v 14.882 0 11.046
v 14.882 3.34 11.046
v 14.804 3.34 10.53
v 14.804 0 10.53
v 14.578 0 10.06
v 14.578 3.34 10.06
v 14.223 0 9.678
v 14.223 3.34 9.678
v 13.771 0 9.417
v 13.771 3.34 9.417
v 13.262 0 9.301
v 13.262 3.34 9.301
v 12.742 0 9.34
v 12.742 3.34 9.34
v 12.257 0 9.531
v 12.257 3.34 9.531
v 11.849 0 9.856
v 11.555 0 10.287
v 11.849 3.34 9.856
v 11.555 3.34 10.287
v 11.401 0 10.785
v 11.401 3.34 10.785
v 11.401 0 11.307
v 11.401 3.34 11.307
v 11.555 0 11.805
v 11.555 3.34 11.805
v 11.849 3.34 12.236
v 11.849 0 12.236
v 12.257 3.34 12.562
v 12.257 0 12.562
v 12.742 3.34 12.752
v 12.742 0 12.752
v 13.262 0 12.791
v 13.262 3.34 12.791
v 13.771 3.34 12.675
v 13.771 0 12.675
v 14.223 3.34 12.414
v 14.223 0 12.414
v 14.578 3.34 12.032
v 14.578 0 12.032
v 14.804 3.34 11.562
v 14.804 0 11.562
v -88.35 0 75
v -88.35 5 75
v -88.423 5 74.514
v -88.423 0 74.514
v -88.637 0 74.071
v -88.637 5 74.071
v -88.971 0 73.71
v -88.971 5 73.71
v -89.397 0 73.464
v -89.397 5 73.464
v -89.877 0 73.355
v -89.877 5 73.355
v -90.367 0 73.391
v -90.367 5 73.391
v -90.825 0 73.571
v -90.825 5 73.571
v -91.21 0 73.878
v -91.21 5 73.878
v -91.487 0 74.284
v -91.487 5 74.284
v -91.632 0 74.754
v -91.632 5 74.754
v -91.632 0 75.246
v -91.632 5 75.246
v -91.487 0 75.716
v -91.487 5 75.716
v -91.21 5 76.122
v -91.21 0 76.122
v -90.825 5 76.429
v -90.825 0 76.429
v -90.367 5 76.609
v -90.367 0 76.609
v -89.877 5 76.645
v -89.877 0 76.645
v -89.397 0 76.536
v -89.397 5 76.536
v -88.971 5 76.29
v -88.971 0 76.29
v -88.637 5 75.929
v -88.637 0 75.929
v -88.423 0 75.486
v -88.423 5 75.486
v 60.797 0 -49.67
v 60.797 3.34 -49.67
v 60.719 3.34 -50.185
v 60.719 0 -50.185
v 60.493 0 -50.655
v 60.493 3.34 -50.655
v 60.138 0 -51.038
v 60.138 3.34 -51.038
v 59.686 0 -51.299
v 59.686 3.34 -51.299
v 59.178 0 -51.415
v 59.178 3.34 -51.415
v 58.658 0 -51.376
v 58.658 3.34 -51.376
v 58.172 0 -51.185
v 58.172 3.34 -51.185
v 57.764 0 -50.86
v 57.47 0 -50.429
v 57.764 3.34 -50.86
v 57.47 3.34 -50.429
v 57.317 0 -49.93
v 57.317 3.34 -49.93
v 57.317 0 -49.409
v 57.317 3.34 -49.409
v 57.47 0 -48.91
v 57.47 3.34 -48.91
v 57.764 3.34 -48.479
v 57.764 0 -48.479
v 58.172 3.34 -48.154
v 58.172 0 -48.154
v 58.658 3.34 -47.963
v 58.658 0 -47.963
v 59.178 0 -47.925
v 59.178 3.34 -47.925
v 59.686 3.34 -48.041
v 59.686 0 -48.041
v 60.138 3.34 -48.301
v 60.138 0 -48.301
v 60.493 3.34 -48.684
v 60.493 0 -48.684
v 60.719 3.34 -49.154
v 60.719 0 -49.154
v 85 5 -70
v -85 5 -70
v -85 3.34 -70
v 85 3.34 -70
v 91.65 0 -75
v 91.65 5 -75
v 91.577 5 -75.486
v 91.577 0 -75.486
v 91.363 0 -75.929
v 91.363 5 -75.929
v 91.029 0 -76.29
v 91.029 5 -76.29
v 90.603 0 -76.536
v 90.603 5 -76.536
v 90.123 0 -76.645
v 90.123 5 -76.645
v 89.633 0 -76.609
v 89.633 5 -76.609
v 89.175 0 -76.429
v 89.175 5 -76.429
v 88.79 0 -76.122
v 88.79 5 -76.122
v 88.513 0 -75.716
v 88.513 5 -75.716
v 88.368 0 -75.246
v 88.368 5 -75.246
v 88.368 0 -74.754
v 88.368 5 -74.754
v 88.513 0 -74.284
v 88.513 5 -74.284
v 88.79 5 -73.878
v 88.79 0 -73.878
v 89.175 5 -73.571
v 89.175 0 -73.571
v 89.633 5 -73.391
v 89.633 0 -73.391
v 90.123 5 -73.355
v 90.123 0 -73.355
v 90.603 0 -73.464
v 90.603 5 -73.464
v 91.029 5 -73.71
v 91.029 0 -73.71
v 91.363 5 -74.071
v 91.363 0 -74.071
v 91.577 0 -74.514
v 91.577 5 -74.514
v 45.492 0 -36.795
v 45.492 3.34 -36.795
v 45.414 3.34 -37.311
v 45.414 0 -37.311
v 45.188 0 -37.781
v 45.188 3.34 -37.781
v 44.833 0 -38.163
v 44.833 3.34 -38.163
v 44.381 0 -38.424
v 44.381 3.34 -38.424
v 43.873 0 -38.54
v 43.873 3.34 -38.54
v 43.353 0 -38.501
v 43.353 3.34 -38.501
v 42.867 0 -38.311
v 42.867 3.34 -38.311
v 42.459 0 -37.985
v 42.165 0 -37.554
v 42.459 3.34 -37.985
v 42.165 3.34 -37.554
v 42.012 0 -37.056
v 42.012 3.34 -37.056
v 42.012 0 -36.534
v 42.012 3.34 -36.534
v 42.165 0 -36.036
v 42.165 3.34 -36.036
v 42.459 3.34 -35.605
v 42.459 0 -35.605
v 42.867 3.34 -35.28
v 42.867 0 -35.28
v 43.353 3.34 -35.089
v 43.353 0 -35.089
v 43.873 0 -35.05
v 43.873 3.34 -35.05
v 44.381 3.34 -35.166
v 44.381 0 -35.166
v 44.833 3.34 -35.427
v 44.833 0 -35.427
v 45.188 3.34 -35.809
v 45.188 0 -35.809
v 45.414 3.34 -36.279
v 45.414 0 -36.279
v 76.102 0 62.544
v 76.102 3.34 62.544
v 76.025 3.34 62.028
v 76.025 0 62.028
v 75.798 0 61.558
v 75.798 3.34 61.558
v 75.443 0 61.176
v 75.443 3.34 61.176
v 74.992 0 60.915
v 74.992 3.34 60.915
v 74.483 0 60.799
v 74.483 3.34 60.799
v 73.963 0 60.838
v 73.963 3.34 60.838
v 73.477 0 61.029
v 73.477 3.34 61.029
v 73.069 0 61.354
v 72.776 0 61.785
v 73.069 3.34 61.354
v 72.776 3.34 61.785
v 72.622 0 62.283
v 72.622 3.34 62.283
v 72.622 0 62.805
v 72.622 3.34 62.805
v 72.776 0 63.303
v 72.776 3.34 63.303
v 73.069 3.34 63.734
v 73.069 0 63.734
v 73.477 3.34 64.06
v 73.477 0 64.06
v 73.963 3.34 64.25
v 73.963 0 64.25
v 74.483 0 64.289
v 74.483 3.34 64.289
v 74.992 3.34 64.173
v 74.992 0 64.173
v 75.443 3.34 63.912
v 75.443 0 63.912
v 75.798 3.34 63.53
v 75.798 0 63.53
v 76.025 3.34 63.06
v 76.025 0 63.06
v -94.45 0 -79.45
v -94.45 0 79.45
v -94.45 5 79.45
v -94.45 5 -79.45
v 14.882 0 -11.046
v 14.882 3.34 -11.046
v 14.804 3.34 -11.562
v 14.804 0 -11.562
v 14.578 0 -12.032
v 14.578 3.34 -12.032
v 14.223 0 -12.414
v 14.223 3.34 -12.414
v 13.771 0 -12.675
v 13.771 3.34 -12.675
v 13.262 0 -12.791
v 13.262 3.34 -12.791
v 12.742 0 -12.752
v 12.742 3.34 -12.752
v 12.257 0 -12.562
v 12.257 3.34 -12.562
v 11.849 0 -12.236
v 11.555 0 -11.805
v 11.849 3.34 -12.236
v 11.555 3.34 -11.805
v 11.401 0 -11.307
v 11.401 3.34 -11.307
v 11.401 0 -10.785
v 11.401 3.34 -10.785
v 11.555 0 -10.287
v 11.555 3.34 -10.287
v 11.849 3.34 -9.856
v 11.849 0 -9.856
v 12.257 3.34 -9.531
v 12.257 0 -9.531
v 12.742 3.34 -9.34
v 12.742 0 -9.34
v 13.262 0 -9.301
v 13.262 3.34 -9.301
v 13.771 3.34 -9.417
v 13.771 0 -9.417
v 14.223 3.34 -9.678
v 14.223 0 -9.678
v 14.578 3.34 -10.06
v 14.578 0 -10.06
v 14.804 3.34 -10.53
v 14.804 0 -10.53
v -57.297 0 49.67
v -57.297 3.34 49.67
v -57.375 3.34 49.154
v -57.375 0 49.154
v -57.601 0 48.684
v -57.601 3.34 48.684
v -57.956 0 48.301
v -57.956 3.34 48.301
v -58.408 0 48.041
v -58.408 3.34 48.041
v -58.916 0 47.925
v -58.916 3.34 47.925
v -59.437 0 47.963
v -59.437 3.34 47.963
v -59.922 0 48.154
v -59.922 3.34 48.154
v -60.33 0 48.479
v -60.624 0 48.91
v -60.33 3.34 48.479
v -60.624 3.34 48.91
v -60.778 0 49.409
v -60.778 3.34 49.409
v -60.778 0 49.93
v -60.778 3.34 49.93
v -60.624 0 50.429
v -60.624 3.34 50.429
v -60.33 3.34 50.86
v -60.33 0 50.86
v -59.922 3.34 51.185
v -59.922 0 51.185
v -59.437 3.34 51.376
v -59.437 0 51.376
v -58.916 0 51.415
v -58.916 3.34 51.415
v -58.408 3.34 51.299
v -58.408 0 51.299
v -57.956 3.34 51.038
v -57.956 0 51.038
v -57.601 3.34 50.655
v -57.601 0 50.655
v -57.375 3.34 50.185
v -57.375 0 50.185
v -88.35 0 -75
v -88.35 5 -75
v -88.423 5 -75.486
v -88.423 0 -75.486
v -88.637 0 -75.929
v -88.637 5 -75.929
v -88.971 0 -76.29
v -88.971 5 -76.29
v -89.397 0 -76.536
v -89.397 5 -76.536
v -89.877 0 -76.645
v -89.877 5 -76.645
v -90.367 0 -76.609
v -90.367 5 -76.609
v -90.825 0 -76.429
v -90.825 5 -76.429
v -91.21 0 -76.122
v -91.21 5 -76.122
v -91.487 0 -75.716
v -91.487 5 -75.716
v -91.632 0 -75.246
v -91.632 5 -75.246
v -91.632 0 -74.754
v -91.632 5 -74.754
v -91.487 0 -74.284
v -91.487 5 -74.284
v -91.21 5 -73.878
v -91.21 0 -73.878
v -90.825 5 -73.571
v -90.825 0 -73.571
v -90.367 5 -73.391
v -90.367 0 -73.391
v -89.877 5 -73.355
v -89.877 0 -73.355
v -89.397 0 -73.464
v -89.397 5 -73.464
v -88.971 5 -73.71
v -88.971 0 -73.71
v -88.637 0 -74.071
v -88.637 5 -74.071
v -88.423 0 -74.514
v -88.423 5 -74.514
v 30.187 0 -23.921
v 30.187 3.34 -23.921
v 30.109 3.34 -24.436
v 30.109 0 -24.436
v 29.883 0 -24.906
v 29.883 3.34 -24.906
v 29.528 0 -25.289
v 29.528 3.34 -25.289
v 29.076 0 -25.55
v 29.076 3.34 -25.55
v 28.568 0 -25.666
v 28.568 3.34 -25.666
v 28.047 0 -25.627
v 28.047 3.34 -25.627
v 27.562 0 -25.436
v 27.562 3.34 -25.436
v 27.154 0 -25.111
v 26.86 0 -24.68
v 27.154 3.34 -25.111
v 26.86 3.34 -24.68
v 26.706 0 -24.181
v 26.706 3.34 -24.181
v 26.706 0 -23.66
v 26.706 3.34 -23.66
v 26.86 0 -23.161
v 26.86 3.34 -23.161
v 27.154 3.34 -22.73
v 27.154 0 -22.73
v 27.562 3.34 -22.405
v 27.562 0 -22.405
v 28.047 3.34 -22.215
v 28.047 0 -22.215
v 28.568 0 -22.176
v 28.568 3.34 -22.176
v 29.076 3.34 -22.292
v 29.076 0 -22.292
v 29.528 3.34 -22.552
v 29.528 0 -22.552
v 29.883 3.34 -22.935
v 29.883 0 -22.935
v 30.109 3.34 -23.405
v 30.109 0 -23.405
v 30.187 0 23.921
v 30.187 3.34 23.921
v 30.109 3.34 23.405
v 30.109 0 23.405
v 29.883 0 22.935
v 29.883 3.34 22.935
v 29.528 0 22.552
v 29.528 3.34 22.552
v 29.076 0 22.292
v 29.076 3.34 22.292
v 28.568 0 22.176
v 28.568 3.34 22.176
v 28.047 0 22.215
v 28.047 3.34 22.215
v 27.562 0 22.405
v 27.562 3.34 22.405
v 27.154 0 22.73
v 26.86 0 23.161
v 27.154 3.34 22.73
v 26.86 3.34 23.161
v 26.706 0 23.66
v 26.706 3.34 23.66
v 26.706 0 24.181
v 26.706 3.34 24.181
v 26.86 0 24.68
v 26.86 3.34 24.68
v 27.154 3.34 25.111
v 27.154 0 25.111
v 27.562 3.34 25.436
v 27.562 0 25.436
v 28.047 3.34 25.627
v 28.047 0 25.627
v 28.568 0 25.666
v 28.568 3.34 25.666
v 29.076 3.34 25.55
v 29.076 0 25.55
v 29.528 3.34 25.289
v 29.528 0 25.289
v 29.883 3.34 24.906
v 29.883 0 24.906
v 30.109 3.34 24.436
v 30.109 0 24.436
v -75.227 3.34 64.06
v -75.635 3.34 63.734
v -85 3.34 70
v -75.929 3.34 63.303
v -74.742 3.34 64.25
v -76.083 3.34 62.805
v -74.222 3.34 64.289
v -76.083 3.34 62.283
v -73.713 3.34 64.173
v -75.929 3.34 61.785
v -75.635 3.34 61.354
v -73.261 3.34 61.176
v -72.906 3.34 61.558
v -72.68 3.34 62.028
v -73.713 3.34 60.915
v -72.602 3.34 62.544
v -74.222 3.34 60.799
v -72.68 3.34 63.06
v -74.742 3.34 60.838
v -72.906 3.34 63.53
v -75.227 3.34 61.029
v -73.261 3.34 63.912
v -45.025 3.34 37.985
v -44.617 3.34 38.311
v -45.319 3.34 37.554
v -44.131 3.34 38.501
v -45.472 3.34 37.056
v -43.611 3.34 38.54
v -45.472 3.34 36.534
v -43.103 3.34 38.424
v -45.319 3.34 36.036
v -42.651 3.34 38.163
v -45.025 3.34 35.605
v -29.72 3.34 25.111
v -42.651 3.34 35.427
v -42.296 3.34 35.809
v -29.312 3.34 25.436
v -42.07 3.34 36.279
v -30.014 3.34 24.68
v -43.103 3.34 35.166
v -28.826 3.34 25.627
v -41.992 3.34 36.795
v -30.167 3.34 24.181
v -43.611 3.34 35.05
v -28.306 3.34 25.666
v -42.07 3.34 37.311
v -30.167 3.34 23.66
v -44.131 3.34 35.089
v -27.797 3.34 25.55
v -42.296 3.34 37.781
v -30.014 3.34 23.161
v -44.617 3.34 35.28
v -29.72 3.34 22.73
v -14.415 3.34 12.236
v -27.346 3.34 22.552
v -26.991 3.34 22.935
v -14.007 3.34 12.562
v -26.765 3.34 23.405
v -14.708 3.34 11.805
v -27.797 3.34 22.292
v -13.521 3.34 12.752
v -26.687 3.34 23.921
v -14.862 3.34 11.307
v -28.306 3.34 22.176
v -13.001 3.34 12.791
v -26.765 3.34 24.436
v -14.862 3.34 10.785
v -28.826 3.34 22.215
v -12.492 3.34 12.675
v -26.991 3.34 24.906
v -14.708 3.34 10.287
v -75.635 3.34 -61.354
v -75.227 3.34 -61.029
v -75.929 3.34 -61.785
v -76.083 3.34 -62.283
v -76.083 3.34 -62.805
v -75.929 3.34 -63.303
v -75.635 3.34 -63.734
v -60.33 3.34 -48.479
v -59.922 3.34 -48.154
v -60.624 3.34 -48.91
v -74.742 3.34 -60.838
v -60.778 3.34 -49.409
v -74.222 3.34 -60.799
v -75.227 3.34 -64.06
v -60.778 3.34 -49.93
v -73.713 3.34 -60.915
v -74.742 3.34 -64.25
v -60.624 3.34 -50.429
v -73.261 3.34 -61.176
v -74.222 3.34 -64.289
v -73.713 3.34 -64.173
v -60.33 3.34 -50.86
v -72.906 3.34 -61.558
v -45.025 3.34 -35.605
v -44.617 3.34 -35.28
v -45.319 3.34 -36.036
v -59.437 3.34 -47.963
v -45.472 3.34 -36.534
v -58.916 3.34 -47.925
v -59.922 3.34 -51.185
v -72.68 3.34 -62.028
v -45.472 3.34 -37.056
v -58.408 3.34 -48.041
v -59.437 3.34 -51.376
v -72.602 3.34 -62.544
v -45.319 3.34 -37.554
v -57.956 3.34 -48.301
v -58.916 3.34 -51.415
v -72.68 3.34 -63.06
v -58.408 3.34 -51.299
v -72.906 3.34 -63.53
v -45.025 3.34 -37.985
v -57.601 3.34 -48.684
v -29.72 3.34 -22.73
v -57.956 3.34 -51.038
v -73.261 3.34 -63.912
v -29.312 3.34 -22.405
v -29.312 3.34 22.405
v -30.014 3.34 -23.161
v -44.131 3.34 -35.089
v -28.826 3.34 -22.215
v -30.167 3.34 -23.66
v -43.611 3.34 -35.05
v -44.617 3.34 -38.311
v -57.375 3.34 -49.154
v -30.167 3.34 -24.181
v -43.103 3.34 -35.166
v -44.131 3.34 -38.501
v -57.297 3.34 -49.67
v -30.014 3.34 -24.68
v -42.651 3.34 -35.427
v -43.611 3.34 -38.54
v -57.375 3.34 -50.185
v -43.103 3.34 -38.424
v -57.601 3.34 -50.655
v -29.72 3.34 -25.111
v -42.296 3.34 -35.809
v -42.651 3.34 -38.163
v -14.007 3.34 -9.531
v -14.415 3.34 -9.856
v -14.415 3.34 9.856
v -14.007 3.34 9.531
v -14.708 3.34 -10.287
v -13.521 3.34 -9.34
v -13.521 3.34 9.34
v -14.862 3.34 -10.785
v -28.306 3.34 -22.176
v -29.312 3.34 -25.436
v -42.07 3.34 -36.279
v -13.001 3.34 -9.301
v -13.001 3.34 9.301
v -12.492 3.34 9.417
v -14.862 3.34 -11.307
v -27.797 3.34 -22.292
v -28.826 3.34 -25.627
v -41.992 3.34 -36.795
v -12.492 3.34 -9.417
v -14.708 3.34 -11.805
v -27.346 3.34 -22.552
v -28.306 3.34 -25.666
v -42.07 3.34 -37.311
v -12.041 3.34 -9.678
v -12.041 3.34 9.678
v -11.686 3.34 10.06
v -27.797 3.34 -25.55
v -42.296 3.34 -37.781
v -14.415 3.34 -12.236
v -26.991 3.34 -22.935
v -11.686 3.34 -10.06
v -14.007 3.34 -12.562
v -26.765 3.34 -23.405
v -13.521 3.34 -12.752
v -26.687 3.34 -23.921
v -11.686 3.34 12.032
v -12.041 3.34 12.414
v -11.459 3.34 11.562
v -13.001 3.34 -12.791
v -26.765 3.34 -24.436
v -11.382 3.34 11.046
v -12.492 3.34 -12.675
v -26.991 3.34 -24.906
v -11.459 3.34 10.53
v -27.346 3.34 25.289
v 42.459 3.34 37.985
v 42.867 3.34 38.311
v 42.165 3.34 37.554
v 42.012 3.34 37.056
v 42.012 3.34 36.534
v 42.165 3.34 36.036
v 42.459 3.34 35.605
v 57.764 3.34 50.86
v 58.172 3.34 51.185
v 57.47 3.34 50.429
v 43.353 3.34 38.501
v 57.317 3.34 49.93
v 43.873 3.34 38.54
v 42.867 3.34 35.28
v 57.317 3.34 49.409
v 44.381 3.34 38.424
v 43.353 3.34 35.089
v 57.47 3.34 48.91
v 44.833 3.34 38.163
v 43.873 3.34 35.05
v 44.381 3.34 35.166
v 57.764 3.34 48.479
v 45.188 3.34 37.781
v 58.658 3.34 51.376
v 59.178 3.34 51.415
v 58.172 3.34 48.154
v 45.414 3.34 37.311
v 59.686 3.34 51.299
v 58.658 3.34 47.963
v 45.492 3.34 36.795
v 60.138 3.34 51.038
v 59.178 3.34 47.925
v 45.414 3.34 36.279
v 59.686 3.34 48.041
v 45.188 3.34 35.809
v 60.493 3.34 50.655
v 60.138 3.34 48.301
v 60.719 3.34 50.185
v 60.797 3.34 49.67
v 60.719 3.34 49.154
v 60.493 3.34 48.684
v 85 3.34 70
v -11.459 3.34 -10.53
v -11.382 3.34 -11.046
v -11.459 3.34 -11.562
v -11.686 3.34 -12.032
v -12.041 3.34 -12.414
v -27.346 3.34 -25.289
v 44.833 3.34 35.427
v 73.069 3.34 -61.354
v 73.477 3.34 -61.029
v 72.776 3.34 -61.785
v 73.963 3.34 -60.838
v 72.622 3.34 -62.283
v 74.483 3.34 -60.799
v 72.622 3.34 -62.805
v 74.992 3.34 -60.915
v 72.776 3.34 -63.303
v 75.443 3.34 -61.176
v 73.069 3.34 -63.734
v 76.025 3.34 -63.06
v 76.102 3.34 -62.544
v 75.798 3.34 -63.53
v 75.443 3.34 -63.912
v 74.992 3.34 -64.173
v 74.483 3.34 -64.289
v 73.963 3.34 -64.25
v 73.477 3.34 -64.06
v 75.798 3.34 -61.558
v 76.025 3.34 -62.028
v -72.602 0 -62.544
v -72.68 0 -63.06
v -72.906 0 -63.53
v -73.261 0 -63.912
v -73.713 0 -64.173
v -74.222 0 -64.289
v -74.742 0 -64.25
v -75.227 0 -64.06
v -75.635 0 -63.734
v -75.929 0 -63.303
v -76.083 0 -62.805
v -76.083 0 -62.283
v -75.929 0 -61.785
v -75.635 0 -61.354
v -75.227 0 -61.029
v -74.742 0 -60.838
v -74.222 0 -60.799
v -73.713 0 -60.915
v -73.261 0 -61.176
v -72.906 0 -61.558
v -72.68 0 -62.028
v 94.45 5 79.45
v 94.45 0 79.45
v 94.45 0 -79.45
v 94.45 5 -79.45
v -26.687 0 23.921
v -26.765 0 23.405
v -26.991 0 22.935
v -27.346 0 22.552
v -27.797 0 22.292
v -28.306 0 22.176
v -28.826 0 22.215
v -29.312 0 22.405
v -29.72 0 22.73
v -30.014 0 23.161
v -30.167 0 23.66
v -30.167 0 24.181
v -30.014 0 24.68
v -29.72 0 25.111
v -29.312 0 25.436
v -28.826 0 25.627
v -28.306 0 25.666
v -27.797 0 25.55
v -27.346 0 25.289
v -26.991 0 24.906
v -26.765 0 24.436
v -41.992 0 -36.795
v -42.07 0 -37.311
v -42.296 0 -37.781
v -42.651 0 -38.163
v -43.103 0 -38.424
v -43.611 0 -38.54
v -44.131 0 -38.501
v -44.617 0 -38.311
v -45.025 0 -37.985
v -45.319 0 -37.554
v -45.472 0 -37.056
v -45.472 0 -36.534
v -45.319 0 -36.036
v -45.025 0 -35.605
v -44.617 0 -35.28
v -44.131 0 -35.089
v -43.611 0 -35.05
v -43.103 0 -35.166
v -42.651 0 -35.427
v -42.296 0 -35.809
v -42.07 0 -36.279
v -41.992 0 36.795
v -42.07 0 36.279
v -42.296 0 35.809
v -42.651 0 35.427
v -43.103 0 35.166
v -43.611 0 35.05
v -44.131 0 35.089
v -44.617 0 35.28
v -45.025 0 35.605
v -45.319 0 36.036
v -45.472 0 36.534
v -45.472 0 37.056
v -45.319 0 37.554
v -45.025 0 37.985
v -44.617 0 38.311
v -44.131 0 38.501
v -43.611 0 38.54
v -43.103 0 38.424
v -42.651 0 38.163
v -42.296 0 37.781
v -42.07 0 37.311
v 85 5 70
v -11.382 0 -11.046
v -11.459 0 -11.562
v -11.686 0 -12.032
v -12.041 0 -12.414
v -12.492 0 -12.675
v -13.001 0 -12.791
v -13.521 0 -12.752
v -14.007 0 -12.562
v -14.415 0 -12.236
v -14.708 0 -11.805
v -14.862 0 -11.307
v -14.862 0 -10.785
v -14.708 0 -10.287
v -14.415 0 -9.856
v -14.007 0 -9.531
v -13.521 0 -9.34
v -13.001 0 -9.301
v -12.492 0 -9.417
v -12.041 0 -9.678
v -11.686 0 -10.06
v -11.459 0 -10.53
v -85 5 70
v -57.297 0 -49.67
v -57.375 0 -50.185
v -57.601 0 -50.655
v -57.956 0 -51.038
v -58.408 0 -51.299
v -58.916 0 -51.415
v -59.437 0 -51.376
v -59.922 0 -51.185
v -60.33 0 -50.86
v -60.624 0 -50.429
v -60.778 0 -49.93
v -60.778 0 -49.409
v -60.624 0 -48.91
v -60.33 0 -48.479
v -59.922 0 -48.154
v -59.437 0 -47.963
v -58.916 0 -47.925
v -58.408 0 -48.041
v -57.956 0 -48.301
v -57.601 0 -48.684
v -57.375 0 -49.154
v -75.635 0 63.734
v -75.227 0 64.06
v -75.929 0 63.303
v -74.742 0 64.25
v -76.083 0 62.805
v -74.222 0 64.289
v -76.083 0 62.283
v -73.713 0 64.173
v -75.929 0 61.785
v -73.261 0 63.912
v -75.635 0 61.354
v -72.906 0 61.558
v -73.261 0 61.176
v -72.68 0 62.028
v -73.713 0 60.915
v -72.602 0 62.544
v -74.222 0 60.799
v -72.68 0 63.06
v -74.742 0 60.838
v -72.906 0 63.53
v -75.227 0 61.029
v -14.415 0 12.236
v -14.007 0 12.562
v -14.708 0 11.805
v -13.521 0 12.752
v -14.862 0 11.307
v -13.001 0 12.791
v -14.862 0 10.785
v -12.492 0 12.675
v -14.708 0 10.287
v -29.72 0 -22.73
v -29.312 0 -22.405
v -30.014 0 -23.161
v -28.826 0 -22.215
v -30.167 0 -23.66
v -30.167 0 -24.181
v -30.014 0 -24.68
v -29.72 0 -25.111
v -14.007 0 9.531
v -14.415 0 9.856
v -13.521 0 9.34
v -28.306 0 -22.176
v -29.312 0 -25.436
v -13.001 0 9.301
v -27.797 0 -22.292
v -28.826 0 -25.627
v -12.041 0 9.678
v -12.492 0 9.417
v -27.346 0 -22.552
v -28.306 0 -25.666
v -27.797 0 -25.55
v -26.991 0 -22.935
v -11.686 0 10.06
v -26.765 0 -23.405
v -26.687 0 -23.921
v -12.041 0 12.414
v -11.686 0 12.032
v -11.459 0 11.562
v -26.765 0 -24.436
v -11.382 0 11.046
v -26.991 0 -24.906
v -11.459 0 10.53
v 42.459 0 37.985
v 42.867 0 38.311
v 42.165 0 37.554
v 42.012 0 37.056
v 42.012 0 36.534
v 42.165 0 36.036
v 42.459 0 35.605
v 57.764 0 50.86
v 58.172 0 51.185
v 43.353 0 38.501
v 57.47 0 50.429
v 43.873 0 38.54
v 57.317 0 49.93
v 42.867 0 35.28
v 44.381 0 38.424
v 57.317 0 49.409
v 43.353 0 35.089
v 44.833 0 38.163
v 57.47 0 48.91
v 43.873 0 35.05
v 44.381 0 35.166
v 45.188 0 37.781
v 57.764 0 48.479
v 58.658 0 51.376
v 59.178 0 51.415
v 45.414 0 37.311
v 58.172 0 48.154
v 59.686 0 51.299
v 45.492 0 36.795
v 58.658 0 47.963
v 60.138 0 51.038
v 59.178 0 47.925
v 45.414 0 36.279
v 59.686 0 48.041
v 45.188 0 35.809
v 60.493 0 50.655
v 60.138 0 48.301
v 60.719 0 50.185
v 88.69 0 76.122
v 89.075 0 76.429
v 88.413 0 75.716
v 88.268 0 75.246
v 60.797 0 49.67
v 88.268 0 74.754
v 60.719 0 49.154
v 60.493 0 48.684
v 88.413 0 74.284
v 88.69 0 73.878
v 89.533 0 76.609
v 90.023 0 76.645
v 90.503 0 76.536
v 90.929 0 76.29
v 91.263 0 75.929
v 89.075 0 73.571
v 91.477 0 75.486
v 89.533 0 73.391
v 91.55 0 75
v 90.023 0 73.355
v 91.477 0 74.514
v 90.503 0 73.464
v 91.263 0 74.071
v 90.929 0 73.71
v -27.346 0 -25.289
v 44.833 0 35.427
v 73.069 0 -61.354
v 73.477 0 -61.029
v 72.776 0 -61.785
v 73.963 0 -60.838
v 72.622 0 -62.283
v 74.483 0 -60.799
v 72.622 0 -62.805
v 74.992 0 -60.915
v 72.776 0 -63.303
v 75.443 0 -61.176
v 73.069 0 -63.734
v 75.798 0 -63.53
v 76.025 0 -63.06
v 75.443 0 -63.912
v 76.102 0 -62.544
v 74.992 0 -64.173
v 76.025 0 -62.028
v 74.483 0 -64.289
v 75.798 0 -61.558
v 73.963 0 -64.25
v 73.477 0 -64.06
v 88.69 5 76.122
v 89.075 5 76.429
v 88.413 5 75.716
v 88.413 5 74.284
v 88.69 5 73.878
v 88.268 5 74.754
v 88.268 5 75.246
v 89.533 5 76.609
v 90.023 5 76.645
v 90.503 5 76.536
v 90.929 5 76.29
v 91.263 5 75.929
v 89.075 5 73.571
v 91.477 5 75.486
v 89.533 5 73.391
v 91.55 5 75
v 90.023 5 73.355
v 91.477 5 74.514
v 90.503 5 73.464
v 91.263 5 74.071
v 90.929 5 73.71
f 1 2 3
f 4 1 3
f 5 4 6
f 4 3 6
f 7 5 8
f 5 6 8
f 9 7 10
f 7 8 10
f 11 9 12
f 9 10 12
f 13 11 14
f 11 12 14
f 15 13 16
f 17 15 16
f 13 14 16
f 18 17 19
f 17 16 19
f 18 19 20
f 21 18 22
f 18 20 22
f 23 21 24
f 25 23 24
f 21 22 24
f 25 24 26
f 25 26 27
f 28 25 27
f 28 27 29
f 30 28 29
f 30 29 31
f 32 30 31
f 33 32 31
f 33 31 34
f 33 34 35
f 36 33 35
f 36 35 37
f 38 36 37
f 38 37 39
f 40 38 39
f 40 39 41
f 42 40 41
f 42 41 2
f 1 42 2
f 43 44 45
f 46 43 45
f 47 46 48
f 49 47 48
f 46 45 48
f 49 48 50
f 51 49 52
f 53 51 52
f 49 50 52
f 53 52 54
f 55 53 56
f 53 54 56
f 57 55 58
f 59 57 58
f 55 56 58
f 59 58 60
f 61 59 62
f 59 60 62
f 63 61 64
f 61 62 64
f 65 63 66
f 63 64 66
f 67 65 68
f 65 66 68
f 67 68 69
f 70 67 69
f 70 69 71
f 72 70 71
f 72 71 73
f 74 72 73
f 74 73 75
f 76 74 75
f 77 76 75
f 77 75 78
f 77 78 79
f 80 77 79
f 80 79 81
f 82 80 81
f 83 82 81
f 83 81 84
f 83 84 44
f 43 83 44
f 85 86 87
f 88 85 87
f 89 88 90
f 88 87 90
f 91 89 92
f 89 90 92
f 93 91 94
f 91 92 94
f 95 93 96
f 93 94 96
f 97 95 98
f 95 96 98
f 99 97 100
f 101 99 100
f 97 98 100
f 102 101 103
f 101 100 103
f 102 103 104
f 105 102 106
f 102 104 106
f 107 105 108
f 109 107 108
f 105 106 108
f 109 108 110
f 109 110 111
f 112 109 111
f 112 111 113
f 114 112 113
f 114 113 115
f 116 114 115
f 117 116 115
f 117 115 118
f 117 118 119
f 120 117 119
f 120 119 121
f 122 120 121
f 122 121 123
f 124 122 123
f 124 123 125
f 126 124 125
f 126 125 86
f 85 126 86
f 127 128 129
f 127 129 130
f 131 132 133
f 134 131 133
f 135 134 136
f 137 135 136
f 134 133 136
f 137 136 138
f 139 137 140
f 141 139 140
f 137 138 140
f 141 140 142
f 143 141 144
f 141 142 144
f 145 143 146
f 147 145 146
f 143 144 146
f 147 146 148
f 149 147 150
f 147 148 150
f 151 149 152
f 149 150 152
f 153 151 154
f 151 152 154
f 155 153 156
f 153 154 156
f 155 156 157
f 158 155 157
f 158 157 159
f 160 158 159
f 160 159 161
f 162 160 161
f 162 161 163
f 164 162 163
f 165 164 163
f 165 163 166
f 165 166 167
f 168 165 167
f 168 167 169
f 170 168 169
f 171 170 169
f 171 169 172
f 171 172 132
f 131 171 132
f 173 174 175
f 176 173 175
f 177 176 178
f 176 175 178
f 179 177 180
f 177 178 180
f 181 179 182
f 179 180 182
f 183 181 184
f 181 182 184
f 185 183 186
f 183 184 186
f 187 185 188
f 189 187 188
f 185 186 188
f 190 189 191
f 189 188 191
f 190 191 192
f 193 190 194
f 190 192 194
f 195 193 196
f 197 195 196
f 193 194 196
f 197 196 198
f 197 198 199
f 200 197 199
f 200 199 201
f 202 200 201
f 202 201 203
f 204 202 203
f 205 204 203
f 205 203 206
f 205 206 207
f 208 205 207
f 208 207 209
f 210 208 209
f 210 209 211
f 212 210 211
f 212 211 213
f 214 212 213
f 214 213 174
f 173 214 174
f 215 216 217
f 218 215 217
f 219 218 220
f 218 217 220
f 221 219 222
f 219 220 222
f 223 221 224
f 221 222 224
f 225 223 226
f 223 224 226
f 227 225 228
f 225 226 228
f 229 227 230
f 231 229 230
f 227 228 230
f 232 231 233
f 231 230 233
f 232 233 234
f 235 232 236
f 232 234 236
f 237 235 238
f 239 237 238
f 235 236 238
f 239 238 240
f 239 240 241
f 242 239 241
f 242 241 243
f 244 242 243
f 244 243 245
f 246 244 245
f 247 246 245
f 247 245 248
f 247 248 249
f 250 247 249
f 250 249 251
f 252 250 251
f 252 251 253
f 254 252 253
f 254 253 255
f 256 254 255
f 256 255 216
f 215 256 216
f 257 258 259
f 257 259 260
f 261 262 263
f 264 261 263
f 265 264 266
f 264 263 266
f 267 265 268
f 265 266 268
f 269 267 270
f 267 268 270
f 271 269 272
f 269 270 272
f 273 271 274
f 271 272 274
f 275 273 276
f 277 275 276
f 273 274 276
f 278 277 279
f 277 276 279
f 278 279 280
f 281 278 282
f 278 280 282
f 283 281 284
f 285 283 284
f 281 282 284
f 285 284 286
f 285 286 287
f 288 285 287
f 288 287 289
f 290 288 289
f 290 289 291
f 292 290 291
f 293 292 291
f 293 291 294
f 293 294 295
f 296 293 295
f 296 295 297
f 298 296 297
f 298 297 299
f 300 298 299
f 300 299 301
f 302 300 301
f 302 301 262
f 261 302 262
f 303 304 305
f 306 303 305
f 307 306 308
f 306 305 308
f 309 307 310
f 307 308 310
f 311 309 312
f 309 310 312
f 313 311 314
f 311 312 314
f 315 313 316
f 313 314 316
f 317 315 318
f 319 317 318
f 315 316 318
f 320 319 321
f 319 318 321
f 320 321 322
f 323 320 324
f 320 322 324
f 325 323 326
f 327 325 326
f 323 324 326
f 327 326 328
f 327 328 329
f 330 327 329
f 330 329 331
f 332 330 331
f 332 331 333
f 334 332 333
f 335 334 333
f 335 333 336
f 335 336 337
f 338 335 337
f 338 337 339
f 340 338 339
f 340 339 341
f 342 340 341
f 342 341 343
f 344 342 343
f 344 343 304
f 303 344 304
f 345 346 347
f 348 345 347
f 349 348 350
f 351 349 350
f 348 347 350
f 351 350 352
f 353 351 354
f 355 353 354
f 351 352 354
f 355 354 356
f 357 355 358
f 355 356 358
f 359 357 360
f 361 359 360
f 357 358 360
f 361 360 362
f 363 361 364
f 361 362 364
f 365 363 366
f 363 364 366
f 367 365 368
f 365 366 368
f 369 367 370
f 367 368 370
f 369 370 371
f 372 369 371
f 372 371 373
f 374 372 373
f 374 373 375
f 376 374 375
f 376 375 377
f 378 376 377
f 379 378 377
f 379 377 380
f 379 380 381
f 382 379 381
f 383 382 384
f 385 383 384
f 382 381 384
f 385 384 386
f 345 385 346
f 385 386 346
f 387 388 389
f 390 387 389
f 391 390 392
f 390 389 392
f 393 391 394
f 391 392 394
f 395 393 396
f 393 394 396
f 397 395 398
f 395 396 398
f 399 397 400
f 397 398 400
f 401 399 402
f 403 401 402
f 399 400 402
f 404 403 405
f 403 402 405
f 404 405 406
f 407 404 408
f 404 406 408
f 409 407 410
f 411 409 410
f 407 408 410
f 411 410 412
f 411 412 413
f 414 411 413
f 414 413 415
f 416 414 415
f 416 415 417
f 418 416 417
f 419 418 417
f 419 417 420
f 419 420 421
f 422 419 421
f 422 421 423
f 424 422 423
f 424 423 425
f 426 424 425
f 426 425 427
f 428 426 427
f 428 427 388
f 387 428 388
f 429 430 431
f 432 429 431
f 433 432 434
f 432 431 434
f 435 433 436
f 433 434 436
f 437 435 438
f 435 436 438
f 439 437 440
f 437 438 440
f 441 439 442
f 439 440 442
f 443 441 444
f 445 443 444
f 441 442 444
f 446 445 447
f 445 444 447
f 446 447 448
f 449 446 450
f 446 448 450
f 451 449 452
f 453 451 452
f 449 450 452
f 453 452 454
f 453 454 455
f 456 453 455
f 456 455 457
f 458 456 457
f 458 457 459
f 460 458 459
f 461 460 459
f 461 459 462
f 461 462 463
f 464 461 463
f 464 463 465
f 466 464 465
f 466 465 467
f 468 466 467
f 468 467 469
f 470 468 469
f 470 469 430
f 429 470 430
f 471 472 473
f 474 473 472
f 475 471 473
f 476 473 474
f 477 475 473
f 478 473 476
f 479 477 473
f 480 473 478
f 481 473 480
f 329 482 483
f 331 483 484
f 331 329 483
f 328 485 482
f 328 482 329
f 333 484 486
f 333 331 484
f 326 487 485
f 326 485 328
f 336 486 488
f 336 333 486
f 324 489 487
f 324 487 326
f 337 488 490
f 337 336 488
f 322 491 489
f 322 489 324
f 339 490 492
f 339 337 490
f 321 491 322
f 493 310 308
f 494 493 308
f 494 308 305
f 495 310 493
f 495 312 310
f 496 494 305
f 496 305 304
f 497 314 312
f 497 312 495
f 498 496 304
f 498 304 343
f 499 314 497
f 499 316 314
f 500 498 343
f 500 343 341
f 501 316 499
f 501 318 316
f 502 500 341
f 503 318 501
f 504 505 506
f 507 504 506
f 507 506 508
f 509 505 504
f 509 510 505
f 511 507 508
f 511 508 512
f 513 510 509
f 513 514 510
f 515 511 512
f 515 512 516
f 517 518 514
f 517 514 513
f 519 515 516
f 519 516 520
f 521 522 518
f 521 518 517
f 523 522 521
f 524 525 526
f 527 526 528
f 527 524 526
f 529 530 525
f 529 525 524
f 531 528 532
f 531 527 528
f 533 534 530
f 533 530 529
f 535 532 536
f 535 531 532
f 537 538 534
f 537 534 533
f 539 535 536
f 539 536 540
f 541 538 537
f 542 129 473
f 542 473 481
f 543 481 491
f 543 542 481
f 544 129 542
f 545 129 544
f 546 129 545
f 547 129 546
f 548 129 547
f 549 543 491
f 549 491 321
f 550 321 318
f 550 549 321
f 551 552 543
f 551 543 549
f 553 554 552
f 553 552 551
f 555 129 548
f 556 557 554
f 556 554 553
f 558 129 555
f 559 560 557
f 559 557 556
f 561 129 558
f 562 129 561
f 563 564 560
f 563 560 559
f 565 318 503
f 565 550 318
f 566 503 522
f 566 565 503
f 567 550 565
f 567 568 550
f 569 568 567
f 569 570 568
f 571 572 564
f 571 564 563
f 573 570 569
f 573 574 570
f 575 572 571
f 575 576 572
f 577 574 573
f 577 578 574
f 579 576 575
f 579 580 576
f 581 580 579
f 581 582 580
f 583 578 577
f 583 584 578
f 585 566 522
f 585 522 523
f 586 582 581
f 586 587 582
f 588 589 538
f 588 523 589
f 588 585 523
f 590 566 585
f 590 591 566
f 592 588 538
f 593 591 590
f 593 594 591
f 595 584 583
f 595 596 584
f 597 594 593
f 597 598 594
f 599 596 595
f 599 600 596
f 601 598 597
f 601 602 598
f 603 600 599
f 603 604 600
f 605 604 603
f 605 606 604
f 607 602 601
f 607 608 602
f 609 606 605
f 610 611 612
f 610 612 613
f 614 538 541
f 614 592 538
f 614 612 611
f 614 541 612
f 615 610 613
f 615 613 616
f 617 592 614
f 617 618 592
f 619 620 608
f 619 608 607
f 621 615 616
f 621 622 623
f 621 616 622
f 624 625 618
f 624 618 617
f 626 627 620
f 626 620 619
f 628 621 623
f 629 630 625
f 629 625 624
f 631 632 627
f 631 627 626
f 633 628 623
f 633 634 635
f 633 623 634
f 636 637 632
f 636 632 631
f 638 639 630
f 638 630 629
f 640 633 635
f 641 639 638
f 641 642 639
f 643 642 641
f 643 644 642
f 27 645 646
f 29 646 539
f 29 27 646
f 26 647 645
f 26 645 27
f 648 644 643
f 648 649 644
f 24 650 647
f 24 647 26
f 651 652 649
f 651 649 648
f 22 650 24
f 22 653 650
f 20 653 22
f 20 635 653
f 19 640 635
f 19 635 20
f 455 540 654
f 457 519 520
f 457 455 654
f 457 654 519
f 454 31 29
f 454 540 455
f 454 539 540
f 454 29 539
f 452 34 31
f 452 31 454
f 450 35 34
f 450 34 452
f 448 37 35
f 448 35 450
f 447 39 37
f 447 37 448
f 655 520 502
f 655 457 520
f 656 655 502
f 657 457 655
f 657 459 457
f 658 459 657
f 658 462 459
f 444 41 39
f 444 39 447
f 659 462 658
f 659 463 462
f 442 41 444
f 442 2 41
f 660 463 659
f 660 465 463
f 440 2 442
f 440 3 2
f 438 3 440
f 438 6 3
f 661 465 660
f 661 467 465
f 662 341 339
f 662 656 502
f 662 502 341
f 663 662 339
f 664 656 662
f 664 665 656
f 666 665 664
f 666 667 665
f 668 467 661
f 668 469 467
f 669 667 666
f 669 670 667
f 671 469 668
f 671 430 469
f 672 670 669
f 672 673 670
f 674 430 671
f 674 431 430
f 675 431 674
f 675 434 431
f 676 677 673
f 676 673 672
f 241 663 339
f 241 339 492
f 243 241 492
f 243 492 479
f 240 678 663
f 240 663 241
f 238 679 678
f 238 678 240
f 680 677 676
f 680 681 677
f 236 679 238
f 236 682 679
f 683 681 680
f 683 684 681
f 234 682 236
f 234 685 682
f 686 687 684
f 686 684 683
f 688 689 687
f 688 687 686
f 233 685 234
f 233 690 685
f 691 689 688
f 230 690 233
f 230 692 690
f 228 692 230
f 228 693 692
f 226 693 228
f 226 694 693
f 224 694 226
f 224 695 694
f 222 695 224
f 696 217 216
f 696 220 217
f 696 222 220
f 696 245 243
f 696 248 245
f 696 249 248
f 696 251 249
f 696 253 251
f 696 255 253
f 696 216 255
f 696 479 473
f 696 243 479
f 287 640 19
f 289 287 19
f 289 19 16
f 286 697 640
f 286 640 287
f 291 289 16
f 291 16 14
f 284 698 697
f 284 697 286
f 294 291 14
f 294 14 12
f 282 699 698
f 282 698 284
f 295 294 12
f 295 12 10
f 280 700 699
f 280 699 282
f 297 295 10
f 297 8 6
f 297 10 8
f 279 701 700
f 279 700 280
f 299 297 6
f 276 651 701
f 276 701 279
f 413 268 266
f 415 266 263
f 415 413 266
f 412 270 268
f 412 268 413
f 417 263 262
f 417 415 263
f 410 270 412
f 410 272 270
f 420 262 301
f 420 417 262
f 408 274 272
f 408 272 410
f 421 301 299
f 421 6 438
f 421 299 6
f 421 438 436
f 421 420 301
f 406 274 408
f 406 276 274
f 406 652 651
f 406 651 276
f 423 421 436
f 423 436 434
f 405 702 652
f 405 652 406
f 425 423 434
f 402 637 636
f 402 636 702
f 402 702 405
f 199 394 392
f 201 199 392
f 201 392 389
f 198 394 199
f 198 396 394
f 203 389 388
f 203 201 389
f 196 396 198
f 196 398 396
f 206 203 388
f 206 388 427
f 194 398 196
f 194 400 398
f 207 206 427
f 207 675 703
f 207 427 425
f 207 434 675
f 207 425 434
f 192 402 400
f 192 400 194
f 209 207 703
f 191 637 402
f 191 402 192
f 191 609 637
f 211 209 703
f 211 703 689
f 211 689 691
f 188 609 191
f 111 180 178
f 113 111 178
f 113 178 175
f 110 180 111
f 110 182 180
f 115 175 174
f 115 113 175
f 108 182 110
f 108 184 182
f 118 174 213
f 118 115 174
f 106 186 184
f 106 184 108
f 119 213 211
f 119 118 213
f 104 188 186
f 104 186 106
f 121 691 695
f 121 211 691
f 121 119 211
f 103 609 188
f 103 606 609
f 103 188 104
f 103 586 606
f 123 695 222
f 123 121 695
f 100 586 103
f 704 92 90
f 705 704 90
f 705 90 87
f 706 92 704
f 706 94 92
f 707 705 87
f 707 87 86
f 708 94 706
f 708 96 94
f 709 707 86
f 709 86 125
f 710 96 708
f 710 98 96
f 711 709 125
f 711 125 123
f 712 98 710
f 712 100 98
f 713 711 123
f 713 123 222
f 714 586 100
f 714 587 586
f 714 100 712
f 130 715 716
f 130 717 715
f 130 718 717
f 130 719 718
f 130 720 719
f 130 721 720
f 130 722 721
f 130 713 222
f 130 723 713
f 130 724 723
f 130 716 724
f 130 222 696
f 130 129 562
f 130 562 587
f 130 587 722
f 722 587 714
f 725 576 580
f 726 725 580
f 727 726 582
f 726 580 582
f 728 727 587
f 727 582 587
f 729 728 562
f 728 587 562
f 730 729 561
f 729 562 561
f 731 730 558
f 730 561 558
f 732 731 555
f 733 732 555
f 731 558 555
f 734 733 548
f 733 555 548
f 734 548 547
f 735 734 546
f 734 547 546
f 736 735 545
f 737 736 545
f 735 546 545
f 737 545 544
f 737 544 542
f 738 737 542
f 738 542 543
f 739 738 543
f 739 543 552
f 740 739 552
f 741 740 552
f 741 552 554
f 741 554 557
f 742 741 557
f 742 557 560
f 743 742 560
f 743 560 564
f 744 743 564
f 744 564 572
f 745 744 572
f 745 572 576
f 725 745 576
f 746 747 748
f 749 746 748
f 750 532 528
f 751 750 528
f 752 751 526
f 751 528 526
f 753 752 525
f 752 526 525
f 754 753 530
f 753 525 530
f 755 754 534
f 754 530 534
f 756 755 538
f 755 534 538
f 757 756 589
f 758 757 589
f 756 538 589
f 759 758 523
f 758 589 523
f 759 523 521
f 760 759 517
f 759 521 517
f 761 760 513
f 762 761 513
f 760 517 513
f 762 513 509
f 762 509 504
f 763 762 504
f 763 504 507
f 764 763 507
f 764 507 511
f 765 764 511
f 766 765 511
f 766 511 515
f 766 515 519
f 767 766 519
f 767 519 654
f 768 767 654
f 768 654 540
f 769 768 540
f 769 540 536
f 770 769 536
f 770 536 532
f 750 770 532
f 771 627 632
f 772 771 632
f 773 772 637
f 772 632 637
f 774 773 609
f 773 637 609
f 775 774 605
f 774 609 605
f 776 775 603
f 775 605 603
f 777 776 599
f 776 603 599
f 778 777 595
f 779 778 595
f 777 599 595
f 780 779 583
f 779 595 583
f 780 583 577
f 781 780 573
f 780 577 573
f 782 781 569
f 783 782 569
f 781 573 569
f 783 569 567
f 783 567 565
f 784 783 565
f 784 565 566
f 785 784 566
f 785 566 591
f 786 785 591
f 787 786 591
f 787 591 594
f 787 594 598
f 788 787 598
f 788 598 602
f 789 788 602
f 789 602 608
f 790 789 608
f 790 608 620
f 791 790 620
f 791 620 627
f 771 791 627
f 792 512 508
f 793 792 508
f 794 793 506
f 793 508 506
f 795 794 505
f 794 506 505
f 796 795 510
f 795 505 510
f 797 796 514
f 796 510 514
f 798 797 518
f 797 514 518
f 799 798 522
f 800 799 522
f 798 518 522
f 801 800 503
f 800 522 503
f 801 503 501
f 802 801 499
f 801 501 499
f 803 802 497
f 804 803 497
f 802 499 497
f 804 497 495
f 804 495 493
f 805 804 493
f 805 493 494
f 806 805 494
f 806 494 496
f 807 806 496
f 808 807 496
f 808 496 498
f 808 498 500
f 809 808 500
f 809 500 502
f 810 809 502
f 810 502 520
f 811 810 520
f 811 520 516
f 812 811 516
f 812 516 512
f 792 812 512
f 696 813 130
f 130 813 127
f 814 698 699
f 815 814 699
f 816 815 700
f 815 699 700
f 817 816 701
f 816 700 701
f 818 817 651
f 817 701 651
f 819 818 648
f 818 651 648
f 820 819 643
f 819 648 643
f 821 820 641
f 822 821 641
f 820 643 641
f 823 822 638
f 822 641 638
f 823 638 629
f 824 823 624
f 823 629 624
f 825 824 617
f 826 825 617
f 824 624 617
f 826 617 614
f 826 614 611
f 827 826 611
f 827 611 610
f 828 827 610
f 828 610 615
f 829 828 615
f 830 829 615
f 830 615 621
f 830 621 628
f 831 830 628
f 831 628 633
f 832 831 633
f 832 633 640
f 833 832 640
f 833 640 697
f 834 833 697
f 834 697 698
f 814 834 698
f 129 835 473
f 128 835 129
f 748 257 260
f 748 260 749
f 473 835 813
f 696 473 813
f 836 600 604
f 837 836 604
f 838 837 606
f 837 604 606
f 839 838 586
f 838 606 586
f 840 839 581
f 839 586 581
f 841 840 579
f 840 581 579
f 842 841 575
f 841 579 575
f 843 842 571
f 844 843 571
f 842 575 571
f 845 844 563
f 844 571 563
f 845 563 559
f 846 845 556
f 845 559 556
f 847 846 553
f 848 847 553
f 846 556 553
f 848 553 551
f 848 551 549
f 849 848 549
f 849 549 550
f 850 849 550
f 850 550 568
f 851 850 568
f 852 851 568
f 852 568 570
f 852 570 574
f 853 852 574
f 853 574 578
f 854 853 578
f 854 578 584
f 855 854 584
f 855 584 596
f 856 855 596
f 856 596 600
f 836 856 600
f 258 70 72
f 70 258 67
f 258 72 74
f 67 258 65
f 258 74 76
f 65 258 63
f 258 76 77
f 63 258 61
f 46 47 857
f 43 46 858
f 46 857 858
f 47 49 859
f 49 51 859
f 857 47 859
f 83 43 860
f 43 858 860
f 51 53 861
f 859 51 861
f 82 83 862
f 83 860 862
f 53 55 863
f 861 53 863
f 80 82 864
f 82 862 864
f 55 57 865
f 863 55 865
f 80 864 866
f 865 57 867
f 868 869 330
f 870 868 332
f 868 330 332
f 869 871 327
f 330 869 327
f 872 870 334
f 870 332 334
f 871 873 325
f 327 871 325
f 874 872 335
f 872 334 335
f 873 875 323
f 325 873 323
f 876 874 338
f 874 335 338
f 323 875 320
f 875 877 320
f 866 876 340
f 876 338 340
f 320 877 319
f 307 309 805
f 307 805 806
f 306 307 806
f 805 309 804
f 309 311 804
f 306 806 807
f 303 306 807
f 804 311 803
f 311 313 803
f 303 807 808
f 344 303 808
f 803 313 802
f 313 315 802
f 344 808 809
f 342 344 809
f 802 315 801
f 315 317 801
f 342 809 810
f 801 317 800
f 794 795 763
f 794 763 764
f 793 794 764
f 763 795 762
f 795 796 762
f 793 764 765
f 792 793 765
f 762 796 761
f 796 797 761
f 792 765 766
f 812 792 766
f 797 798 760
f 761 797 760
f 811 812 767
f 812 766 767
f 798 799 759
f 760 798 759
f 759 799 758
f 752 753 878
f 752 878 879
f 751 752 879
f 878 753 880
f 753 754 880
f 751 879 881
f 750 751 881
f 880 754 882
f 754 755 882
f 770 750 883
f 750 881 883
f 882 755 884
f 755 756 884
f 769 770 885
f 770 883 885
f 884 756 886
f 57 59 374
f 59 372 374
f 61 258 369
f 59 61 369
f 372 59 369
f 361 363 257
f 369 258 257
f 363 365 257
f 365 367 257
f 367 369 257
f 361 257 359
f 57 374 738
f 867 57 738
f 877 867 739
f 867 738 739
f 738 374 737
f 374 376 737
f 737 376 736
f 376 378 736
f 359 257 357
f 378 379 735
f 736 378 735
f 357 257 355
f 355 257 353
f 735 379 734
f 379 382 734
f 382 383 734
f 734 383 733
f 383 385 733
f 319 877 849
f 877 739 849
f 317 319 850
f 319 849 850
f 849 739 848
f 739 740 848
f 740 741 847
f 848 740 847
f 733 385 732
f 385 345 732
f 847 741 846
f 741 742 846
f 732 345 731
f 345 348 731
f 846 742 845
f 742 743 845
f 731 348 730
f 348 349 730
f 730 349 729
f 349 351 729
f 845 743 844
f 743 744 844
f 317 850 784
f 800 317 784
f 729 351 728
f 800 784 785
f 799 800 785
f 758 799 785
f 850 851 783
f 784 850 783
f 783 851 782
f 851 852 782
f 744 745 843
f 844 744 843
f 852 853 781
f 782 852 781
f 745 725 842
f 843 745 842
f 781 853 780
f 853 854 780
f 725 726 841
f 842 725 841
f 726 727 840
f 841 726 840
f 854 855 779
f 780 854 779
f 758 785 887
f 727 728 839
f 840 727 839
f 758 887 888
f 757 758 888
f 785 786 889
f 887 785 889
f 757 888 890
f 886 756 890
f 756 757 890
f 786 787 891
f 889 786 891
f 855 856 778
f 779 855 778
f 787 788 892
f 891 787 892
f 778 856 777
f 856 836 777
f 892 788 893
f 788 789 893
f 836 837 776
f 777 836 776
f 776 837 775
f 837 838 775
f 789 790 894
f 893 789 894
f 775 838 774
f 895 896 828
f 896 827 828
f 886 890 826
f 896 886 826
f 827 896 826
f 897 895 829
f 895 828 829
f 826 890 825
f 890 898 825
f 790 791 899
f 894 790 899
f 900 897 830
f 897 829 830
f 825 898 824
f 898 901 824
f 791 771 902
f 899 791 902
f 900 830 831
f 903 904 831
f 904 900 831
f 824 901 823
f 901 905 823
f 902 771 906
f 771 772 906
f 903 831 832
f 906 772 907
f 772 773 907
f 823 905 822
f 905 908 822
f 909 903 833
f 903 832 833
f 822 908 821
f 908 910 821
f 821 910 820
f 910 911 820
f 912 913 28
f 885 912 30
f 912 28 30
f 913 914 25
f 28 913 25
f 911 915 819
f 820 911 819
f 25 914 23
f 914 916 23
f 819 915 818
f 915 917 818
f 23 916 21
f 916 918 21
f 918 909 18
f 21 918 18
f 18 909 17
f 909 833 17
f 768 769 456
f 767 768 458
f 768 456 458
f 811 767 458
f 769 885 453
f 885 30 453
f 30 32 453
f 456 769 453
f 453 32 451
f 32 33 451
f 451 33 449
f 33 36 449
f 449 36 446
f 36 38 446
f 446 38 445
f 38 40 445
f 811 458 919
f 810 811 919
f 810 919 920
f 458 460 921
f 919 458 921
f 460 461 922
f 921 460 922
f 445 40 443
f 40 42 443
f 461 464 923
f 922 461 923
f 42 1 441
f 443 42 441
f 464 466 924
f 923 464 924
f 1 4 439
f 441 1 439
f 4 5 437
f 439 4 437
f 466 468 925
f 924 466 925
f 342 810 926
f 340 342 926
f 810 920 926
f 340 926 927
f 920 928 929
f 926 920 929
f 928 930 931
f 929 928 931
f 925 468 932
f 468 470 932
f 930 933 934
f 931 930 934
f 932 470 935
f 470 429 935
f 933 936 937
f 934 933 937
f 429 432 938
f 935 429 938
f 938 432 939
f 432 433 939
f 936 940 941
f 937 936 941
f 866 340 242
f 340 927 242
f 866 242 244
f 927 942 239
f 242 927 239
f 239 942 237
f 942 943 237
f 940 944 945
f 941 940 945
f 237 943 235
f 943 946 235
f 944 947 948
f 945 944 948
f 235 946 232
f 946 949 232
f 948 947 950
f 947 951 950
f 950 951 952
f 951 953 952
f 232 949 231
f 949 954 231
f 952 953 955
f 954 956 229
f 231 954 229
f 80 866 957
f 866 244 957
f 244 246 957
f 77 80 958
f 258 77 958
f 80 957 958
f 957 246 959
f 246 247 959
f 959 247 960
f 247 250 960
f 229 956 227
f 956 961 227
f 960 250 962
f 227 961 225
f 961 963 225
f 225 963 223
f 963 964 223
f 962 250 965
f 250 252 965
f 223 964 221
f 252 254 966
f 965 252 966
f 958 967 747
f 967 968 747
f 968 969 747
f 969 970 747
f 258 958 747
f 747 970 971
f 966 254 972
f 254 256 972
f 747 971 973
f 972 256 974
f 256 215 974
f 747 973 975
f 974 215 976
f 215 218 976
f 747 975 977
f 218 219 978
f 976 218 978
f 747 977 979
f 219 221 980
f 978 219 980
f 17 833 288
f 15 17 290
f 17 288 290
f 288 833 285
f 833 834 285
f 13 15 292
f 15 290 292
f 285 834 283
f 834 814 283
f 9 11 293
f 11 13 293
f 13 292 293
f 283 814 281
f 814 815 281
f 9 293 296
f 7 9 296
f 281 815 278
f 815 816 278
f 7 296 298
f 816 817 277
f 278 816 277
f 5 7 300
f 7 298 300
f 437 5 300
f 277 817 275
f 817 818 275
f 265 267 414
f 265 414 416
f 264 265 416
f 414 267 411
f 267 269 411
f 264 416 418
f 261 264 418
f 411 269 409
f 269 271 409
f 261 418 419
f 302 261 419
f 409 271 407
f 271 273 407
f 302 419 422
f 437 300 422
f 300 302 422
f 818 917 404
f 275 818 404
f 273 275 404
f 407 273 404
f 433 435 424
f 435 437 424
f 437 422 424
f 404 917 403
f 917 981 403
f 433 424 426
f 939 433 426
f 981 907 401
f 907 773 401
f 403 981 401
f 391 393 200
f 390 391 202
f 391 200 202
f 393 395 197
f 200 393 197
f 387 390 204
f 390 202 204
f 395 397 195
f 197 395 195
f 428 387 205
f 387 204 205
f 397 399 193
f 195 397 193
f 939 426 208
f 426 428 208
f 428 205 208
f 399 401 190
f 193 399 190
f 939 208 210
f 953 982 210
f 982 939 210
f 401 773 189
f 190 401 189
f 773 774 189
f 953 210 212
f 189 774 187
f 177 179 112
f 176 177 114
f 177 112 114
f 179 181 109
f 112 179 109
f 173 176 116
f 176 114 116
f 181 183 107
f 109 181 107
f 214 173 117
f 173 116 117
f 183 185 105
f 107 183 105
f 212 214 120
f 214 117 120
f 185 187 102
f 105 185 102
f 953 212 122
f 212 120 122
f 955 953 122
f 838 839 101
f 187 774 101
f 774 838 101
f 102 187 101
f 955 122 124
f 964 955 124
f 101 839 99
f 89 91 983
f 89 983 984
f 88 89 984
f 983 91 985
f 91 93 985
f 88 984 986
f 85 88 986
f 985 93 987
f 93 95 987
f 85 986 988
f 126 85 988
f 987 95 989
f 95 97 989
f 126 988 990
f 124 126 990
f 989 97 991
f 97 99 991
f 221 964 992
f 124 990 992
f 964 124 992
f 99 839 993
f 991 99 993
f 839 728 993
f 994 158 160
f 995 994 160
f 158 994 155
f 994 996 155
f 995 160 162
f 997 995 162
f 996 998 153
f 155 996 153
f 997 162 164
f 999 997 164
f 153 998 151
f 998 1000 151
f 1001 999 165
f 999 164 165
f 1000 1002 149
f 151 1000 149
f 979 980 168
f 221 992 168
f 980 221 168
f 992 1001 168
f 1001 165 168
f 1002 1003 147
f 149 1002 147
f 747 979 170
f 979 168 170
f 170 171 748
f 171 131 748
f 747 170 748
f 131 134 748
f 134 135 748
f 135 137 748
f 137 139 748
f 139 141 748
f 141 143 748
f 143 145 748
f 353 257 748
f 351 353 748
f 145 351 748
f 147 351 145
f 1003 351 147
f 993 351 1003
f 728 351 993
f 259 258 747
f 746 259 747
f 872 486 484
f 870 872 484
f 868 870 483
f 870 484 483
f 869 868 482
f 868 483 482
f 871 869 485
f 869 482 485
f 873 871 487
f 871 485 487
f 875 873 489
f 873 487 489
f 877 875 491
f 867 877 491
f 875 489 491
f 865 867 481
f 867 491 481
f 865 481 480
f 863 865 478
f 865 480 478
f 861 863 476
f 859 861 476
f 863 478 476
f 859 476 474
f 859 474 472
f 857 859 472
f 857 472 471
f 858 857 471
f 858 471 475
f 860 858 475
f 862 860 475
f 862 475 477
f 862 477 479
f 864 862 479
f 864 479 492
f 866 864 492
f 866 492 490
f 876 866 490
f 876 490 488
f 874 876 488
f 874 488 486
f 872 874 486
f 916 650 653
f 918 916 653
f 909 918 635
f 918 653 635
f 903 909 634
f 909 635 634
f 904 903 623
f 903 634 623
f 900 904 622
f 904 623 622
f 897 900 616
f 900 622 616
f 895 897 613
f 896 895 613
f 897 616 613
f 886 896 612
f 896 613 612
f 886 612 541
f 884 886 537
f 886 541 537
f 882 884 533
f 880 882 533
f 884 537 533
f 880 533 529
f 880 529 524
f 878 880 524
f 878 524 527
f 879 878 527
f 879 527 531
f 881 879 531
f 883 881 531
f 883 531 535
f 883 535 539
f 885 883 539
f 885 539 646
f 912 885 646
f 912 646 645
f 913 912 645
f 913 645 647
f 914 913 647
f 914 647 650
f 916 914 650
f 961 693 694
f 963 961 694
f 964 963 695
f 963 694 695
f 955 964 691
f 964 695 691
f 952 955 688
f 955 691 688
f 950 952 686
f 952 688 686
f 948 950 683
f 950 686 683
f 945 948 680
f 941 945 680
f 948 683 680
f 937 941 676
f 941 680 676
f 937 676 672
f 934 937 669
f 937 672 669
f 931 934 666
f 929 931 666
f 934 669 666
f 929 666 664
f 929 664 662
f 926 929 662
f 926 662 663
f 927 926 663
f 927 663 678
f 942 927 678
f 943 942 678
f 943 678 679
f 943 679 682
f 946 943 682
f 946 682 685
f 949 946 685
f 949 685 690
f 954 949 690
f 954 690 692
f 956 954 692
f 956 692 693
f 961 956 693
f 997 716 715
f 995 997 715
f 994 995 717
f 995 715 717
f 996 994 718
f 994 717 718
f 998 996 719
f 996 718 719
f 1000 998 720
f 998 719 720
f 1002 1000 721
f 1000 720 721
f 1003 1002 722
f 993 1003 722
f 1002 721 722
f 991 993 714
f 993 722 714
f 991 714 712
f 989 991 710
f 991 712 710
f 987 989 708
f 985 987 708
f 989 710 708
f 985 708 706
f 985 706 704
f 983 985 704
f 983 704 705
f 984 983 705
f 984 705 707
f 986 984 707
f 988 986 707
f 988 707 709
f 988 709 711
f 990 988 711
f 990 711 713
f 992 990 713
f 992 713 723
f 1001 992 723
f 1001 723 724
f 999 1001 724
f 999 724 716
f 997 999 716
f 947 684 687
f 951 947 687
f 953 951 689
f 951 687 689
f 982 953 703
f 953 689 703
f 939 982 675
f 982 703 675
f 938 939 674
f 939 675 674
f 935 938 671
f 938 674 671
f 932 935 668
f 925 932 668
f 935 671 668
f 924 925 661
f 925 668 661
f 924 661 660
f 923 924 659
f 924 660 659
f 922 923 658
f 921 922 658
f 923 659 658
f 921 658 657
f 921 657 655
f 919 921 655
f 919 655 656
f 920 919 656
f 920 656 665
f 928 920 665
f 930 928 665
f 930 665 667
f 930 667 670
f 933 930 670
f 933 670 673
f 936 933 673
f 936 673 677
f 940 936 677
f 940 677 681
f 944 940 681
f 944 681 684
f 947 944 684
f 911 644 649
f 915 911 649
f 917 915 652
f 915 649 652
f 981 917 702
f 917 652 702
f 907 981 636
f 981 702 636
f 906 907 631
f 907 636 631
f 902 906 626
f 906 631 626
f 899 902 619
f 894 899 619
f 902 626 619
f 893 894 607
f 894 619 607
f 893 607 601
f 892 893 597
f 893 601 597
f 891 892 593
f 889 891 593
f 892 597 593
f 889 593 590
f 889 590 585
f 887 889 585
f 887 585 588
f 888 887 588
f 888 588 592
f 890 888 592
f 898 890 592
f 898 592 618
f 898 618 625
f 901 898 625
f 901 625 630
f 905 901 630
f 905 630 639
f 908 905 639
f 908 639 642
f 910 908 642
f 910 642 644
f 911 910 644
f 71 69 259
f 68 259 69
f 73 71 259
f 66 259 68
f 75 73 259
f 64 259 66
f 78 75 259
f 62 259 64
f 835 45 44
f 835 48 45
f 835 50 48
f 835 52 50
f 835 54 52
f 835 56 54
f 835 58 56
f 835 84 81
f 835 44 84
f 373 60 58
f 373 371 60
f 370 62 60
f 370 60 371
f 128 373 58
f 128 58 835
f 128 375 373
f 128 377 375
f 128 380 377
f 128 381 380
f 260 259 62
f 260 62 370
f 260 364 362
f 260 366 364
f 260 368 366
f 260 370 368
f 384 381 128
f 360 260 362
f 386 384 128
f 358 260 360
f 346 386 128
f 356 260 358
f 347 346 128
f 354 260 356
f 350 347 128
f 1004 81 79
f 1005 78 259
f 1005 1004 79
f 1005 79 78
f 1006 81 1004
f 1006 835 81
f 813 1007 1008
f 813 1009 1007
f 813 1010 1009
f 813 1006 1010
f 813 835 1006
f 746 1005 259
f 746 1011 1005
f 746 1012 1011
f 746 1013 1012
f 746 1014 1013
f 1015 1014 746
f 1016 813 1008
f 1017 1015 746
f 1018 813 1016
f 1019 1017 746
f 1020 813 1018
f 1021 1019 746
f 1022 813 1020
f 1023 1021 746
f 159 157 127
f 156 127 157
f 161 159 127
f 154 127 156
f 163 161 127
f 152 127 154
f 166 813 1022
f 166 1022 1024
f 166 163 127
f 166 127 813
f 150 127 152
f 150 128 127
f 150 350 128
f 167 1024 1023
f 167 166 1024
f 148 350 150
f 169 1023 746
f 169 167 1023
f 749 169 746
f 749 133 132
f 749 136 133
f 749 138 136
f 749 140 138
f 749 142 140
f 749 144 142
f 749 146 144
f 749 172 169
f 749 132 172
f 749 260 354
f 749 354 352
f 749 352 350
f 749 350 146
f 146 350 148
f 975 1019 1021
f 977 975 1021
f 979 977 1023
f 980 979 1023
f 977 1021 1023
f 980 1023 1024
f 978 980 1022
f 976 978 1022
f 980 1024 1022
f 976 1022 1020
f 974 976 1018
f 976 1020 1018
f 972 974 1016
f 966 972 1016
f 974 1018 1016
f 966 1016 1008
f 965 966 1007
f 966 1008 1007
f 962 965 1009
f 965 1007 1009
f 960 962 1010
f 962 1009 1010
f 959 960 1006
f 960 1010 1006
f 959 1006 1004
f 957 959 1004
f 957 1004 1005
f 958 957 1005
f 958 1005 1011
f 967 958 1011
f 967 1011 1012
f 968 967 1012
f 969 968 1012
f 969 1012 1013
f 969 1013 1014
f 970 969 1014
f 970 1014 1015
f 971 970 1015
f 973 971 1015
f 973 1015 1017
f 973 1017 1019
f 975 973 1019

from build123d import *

# Parameters (mm, degrees)
SKETCH1_W           = 188.9
SKETCH1_H           = 158.9
BOSS_EXTRUDE1_DEPTH = 5
SKETCH2_W           = 170
SKETCH2_H           = 140
CUT_EXTRUDE1_DEPTH  = 1.66
SKETCH3_R           = 1.65
CUT_EXTRUDE2_DEPTH  = 5
SKETCH6_R           = 1.65
CUT_EXTRUDE4_DEPTH  = 10
SKETCH7_R           = 1.75
CUT_EXTRUDE5_DEPTH  = 10


with BuildPart() as part:
    # Sketch1 → Boss-Extrude1 (new body)
    with BuildSketch(Plane(origin=(0, 0, 0), x_dir=(1, 0, 0), z_dir=(0, 1, 0))):
        Rectangle(SKETCH1_W, SKETCH1_H)
    extrude(amount=BOSS_EXTRUDE1_DEPTH)

    # Sketch2 → Cut-Extrude1 (cut)
    with BuildSketch(Plane(origin=(0, 5, 0), x_dir=(1, 0, 0), z_dir=(0, 1, 0))):
        Rectangle(SKETCH2_W, SKETCH2_H)
    extrude(amount=-CUT_EXTRUDE1_DEPTH, mode=Mode.SUBTRACT)

    # Sketch3 → Cut-Extrude2 (cut)
    with BuildSketch(Plane(origin=(0, 5, 0), x_dir=(1, 0, 0), z_dir=(0, 1, 0))):
        with Locations((-90, 75)):
            Circle(SKETCH3_R)
    extrude(amount=-CUT_EXTRUDE2_DEPTH, mode=Mode.SUBTRACT)

    # Sketch6 → Cut-Extrude4 (cut)
    with BuildSketch(Plane(origin=(0, 5, 0), x_dir=(1, 0, 0), z_dir=(0, 1, 0))):
        with Locations((-90, -75)):
            Circle(SKETCH6_R)
        with Locations((89.9, -75)):
            Circle(SKETCH6_R)
        with Locations((90, 75)):
            Circle(SKETCH6_R)
    extrude(amount=-CUT_EXTRUDE4_DEPTH, mode=Mode.SUBTRACT)

    # Sketch7 → Cut-Extrude5 (cut)
    with BuildSketch(Plane(origin=(0, 3.34, 0), x_dir=(1, 0, 0), z_dir=(0, 1, 0))):
        with Locations((-74.352299287, 62.544099294)):
            Circle(SKETCH7_R)
        with Locations((74.352299287, -62.544099294)):
            Circle(SKETCH7_R)
        with Locations((-59.047144008, 49.669619814)):
            Circle(SKETCH7_R)
        with Locations((-43.741988729, 36.795140334)):
            Circle(SKETCH7_R)
        with Locations((-28.43683345, 23.920660853)):
            Circle(SKETCH7_R)
        with Locations((-13.131678171, 11.046181373)):
            Circle(SKETCH7_R)
        with Locations((13.131678171, 11.046181373)):
            Circle(SKETCH7_R)
        with Locations((28.43683345, 23.920660853)):
            Circle(SKETCH7_R)
        with Locations((43.741988729, 36.795140334)):
            Circle(SKETCH7_R)
        with Locations((59.047144008, 49.669619814)):
            Circle(SKETCH7_R)
        with Locations((74.352299287, 62.544099294)):
            Circle(SKETCH7_R)
        with Locations((59.047144008, -49.669619814)):
            Circle(SKETCH7_R)
        with Locations((43.741988729, -36.795140334)):
            Circle(SKETCH7_R)
        with Locations((28.43683345, -23.920660853)):
            Circle(SKETCH7_R)
        with Locations((13.131678171, -11.046181373)):
            Circle(SKETCH7_R)
        with Locations((-13.131678171, -11.046181373)):
            Circle(SKETCH7_R)
        with Locations((-28.43683345, -23.920660853)):
            Circle(SKETCH7_R)
        with Locations((-43.741988729, -36.795140334)):
            Circle(SKETCH7_R)
        with Locations((-59.047144008, -49.669619814)):
            Circle(SKETCH7_R)
        with Locations((-74.352299287, -62.544099294)):
            Circle(SKETCH7_R)
    extrude(amount=-CUT_EXTRUDE5_DEPTH, mode=Mode.SUBTRACT)


solid = part.part
